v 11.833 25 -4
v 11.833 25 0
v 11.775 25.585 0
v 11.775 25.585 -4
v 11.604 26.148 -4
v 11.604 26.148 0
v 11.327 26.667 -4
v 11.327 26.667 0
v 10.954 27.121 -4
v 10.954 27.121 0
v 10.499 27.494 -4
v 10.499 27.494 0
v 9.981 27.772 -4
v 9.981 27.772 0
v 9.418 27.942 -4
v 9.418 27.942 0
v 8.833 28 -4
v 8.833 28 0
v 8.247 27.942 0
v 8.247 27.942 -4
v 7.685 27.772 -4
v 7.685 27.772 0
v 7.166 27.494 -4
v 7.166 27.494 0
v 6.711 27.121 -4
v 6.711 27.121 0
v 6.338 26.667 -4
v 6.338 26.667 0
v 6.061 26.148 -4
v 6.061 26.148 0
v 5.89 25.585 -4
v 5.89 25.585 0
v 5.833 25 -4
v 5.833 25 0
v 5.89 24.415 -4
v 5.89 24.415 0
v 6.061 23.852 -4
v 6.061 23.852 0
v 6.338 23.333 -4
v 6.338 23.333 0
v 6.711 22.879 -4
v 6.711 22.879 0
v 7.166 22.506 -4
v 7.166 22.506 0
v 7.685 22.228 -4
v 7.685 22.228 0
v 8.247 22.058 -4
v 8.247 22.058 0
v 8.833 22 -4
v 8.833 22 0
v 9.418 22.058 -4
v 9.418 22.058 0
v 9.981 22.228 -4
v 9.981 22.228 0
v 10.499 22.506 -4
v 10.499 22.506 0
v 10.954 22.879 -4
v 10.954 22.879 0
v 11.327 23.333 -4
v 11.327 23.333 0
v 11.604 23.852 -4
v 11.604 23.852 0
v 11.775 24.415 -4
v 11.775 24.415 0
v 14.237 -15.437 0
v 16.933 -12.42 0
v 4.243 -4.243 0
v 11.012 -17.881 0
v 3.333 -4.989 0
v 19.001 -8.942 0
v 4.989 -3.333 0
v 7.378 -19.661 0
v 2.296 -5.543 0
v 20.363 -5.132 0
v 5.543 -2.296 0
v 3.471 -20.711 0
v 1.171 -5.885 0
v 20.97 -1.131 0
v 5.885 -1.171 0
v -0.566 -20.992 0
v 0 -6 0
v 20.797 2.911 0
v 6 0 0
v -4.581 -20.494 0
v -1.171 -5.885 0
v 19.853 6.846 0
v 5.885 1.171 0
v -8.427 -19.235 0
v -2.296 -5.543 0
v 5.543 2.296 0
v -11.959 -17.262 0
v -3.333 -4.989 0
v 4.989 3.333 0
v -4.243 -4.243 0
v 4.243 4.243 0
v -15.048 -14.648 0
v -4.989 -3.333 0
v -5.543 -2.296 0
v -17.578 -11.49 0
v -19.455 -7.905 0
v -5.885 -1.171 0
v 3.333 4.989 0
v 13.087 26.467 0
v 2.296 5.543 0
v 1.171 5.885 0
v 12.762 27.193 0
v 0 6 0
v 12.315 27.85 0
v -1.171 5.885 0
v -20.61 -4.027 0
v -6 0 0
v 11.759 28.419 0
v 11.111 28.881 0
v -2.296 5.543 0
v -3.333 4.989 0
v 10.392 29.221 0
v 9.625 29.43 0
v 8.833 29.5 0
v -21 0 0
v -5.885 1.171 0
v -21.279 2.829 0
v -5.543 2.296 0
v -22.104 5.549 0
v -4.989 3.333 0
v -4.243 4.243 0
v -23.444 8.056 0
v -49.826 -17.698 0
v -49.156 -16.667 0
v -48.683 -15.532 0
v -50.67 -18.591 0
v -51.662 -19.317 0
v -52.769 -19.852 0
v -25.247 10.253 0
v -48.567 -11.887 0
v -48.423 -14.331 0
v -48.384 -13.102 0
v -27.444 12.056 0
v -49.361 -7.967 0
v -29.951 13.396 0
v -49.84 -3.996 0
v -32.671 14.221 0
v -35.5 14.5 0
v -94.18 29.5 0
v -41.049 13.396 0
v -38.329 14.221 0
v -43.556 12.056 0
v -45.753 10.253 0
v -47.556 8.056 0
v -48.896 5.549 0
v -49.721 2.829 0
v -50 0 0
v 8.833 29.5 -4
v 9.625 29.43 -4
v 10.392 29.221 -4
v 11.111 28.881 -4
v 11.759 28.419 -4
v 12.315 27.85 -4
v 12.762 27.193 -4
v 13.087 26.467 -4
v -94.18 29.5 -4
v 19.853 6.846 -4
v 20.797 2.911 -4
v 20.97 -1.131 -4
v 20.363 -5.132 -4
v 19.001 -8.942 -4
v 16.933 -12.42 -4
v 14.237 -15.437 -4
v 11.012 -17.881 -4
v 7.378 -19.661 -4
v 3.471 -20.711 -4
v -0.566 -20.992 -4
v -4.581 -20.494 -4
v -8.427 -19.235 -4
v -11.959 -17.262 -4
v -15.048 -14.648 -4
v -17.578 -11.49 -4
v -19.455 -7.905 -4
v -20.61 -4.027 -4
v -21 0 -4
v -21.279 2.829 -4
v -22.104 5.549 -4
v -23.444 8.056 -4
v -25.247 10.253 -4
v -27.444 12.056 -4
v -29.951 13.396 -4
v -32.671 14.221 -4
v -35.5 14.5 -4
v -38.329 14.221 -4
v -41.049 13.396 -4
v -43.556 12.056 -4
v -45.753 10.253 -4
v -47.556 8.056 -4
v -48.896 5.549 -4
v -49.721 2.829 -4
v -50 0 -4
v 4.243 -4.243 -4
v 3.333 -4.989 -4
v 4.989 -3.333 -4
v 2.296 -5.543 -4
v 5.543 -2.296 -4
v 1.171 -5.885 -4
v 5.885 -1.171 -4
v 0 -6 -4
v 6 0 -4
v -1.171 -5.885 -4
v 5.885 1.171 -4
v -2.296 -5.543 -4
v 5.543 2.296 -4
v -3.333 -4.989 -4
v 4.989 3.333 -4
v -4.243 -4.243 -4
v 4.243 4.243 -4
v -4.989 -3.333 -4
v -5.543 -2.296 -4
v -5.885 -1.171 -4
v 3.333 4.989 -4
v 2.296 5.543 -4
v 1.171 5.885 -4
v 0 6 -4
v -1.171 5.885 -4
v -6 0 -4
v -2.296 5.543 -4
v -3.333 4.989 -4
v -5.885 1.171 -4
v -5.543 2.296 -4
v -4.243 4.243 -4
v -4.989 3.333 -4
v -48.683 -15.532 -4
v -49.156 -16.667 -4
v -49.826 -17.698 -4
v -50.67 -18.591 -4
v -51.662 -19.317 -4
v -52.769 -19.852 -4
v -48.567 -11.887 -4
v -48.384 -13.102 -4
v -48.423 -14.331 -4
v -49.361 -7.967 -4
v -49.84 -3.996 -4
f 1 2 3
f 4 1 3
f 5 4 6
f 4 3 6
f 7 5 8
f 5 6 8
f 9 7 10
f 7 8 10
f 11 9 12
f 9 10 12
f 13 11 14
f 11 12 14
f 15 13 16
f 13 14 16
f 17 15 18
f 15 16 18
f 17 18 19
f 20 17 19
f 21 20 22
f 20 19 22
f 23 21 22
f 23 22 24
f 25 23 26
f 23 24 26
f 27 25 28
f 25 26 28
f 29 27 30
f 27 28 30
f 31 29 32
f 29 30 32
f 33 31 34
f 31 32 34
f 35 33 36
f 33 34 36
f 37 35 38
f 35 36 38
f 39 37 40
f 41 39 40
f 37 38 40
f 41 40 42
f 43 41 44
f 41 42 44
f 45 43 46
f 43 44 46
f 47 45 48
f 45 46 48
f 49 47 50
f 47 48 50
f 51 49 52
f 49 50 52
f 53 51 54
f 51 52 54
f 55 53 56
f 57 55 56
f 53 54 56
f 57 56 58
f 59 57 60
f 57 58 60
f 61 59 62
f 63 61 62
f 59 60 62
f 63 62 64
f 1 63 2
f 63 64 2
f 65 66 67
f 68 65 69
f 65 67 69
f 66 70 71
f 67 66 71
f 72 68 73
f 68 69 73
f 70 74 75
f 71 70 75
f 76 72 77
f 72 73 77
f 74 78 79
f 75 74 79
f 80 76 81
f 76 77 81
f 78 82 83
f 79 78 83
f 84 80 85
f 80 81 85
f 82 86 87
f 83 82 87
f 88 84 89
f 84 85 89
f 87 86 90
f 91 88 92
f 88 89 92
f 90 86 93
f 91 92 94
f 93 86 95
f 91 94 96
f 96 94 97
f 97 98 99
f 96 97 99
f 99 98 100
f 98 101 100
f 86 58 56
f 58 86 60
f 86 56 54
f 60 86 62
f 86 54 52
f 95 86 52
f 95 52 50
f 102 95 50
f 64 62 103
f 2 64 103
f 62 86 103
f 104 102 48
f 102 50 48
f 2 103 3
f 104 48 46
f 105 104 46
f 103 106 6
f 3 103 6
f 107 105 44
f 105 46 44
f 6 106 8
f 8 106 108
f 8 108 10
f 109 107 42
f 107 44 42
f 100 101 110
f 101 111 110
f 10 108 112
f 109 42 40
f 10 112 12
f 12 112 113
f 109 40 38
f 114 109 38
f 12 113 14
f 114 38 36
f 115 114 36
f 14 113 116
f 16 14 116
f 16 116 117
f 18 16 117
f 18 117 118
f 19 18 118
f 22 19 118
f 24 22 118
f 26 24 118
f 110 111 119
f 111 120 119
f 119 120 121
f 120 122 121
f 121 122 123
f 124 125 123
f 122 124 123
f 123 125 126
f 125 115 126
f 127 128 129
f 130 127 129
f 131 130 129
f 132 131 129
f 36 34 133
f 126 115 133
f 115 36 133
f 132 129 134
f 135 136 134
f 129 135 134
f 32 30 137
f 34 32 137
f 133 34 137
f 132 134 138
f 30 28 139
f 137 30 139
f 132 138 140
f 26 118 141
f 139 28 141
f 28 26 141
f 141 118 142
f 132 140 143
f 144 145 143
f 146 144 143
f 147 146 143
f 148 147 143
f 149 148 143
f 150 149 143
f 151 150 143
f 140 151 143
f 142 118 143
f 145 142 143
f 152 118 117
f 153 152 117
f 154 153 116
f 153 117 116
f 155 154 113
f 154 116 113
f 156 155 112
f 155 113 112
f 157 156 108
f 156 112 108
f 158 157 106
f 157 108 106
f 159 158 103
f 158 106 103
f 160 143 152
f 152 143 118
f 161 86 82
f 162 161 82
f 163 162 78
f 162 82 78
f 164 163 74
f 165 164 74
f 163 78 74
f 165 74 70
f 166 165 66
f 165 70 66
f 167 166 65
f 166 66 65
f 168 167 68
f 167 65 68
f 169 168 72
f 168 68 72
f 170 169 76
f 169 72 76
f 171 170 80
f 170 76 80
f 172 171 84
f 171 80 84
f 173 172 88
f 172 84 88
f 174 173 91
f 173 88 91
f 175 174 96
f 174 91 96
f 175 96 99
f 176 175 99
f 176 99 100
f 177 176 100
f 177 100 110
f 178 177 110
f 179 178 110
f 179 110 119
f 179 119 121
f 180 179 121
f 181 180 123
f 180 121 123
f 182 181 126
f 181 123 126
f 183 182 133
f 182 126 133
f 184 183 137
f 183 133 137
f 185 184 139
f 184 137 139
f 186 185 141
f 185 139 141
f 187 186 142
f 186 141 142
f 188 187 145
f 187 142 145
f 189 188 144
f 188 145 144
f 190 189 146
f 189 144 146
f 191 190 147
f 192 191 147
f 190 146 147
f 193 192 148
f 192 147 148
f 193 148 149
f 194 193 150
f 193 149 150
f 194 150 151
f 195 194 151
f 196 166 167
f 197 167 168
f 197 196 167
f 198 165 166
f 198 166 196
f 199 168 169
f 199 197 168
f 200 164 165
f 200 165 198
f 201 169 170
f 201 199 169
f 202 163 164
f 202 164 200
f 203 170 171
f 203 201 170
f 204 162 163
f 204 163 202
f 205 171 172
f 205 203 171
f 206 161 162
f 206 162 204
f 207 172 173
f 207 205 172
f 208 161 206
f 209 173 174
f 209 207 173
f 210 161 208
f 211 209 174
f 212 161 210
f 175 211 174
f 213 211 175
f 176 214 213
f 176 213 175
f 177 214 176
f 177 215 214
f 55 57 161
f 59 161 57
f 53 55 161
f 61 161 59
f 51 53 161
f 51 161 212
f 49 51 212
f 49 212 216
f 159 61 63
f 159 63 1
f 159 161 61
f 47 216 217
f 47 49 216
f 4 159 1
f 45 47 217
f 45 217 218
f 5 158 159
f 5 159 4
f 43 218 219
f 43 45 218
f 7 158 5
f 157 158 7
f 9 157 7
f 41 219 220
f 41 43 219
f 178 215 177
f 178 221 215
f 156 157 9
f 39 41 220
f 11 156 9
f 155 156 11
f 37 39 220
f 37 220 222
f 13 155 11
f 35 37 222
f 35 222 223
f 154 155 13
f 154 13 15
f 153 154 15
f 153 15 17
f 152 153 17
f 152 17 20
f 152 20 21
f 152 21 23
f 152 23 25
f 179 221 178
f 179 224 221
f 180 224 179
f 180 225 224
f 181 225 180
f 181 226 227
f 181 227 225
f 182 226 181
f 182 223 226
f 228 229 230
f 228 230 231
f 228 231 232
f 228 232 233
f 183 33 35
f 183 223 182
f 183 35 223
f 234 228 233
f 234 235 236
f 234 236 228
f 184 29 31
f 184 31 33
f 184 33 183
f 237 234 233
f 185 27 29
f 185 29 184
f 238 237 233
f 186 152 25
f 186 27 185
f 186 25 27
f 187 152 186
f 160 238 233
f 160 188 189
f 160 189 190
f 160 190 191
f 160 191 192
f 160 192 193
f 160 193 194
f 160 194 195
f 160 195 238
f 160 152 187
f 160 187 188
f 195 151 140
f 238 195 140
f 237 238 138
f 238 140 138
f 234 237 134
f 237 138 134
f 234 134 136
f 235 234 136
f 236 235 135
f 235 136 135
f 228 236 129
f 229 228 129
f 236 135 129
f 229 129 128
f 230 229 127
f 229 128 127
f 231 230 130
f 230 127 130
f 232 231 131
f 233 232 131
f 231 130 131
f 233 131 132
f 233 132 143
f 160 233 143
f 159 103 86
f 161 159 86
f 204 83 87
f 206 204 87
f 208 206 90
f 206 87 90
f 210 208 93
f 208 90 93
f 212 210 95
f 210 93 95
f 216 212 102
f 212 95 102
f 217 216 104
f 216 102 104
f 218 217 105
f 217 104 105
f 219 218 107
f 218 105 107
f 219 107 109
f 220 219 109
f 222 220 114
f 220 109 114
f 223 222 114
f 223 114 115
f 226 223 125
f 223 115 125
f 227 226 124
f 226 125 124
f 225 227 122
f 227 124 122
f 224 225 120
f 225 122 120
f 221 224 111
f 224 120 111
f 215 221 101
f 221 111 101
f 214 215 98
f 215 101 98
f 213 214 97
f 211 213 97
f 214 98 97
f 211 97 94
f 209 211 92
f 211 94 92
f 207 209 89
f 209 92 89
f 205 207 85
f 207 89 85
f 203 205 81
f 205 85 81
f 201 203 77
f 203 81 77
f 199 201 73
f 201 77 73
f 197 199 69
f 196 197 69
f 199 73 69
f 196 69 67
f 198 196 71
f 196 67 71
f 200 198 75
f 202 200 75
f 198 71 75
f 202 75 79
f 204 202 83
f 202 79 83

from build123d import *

# Parameters (mm, degrees)
SKETCH_1_R             = 6
SKETCH_1_R_2           = 3
SM_BASE_FLANGE_1_DEPTH = 4


# Sheet-metal steps are written as plain solids
with BuildPart() as part:
    # Sketch 1 → Базовая кромка1 (new body)
    with BuildSketch(Plane.XY):
        with BuildLine():
            Line((-94.18015229, 29.5), (0, 29.5))
            Line((0, 29.5), (8.832749987, 29.5))
            ThreePointArc((8.832749987, 29.5), (11.445095498, 28.664103019), (13.086929131, 26.466955969))
            Line((13.086929131, 26.466955969), (19.852836003, 6.845794522))
            ThreePointArc((19.852836003, 6.845794522), (3.470622706, -20.71122348), (-21, 0))
            ThreePointArc((-21, 0), (-35.5, 14.5), (-50, 0))
            ThreePointArc((-50, 0), (-49.640340933, -5.986363846), (-48.566537916, -11.88660569))
            ThreePointArc((-48.566537916, -11.88660569), (-49.156122287, -16.666789945), (-52.76892738, -19.85197606))
            Line((-52.76892738, -19.85197606), (-94.18015229, 29.5))
        make_face()
        Circle(SKETCH_1_R, mode=Mode.SUBTRACT)
        with Locations((8.832749987, 25)):
            Circle(SKETCH_1_R_2, mode=Mode.SUBTRACT)
    extrude(amount=-SM_BASE_FLANGE_1_DEPTH)


solid = part.part
